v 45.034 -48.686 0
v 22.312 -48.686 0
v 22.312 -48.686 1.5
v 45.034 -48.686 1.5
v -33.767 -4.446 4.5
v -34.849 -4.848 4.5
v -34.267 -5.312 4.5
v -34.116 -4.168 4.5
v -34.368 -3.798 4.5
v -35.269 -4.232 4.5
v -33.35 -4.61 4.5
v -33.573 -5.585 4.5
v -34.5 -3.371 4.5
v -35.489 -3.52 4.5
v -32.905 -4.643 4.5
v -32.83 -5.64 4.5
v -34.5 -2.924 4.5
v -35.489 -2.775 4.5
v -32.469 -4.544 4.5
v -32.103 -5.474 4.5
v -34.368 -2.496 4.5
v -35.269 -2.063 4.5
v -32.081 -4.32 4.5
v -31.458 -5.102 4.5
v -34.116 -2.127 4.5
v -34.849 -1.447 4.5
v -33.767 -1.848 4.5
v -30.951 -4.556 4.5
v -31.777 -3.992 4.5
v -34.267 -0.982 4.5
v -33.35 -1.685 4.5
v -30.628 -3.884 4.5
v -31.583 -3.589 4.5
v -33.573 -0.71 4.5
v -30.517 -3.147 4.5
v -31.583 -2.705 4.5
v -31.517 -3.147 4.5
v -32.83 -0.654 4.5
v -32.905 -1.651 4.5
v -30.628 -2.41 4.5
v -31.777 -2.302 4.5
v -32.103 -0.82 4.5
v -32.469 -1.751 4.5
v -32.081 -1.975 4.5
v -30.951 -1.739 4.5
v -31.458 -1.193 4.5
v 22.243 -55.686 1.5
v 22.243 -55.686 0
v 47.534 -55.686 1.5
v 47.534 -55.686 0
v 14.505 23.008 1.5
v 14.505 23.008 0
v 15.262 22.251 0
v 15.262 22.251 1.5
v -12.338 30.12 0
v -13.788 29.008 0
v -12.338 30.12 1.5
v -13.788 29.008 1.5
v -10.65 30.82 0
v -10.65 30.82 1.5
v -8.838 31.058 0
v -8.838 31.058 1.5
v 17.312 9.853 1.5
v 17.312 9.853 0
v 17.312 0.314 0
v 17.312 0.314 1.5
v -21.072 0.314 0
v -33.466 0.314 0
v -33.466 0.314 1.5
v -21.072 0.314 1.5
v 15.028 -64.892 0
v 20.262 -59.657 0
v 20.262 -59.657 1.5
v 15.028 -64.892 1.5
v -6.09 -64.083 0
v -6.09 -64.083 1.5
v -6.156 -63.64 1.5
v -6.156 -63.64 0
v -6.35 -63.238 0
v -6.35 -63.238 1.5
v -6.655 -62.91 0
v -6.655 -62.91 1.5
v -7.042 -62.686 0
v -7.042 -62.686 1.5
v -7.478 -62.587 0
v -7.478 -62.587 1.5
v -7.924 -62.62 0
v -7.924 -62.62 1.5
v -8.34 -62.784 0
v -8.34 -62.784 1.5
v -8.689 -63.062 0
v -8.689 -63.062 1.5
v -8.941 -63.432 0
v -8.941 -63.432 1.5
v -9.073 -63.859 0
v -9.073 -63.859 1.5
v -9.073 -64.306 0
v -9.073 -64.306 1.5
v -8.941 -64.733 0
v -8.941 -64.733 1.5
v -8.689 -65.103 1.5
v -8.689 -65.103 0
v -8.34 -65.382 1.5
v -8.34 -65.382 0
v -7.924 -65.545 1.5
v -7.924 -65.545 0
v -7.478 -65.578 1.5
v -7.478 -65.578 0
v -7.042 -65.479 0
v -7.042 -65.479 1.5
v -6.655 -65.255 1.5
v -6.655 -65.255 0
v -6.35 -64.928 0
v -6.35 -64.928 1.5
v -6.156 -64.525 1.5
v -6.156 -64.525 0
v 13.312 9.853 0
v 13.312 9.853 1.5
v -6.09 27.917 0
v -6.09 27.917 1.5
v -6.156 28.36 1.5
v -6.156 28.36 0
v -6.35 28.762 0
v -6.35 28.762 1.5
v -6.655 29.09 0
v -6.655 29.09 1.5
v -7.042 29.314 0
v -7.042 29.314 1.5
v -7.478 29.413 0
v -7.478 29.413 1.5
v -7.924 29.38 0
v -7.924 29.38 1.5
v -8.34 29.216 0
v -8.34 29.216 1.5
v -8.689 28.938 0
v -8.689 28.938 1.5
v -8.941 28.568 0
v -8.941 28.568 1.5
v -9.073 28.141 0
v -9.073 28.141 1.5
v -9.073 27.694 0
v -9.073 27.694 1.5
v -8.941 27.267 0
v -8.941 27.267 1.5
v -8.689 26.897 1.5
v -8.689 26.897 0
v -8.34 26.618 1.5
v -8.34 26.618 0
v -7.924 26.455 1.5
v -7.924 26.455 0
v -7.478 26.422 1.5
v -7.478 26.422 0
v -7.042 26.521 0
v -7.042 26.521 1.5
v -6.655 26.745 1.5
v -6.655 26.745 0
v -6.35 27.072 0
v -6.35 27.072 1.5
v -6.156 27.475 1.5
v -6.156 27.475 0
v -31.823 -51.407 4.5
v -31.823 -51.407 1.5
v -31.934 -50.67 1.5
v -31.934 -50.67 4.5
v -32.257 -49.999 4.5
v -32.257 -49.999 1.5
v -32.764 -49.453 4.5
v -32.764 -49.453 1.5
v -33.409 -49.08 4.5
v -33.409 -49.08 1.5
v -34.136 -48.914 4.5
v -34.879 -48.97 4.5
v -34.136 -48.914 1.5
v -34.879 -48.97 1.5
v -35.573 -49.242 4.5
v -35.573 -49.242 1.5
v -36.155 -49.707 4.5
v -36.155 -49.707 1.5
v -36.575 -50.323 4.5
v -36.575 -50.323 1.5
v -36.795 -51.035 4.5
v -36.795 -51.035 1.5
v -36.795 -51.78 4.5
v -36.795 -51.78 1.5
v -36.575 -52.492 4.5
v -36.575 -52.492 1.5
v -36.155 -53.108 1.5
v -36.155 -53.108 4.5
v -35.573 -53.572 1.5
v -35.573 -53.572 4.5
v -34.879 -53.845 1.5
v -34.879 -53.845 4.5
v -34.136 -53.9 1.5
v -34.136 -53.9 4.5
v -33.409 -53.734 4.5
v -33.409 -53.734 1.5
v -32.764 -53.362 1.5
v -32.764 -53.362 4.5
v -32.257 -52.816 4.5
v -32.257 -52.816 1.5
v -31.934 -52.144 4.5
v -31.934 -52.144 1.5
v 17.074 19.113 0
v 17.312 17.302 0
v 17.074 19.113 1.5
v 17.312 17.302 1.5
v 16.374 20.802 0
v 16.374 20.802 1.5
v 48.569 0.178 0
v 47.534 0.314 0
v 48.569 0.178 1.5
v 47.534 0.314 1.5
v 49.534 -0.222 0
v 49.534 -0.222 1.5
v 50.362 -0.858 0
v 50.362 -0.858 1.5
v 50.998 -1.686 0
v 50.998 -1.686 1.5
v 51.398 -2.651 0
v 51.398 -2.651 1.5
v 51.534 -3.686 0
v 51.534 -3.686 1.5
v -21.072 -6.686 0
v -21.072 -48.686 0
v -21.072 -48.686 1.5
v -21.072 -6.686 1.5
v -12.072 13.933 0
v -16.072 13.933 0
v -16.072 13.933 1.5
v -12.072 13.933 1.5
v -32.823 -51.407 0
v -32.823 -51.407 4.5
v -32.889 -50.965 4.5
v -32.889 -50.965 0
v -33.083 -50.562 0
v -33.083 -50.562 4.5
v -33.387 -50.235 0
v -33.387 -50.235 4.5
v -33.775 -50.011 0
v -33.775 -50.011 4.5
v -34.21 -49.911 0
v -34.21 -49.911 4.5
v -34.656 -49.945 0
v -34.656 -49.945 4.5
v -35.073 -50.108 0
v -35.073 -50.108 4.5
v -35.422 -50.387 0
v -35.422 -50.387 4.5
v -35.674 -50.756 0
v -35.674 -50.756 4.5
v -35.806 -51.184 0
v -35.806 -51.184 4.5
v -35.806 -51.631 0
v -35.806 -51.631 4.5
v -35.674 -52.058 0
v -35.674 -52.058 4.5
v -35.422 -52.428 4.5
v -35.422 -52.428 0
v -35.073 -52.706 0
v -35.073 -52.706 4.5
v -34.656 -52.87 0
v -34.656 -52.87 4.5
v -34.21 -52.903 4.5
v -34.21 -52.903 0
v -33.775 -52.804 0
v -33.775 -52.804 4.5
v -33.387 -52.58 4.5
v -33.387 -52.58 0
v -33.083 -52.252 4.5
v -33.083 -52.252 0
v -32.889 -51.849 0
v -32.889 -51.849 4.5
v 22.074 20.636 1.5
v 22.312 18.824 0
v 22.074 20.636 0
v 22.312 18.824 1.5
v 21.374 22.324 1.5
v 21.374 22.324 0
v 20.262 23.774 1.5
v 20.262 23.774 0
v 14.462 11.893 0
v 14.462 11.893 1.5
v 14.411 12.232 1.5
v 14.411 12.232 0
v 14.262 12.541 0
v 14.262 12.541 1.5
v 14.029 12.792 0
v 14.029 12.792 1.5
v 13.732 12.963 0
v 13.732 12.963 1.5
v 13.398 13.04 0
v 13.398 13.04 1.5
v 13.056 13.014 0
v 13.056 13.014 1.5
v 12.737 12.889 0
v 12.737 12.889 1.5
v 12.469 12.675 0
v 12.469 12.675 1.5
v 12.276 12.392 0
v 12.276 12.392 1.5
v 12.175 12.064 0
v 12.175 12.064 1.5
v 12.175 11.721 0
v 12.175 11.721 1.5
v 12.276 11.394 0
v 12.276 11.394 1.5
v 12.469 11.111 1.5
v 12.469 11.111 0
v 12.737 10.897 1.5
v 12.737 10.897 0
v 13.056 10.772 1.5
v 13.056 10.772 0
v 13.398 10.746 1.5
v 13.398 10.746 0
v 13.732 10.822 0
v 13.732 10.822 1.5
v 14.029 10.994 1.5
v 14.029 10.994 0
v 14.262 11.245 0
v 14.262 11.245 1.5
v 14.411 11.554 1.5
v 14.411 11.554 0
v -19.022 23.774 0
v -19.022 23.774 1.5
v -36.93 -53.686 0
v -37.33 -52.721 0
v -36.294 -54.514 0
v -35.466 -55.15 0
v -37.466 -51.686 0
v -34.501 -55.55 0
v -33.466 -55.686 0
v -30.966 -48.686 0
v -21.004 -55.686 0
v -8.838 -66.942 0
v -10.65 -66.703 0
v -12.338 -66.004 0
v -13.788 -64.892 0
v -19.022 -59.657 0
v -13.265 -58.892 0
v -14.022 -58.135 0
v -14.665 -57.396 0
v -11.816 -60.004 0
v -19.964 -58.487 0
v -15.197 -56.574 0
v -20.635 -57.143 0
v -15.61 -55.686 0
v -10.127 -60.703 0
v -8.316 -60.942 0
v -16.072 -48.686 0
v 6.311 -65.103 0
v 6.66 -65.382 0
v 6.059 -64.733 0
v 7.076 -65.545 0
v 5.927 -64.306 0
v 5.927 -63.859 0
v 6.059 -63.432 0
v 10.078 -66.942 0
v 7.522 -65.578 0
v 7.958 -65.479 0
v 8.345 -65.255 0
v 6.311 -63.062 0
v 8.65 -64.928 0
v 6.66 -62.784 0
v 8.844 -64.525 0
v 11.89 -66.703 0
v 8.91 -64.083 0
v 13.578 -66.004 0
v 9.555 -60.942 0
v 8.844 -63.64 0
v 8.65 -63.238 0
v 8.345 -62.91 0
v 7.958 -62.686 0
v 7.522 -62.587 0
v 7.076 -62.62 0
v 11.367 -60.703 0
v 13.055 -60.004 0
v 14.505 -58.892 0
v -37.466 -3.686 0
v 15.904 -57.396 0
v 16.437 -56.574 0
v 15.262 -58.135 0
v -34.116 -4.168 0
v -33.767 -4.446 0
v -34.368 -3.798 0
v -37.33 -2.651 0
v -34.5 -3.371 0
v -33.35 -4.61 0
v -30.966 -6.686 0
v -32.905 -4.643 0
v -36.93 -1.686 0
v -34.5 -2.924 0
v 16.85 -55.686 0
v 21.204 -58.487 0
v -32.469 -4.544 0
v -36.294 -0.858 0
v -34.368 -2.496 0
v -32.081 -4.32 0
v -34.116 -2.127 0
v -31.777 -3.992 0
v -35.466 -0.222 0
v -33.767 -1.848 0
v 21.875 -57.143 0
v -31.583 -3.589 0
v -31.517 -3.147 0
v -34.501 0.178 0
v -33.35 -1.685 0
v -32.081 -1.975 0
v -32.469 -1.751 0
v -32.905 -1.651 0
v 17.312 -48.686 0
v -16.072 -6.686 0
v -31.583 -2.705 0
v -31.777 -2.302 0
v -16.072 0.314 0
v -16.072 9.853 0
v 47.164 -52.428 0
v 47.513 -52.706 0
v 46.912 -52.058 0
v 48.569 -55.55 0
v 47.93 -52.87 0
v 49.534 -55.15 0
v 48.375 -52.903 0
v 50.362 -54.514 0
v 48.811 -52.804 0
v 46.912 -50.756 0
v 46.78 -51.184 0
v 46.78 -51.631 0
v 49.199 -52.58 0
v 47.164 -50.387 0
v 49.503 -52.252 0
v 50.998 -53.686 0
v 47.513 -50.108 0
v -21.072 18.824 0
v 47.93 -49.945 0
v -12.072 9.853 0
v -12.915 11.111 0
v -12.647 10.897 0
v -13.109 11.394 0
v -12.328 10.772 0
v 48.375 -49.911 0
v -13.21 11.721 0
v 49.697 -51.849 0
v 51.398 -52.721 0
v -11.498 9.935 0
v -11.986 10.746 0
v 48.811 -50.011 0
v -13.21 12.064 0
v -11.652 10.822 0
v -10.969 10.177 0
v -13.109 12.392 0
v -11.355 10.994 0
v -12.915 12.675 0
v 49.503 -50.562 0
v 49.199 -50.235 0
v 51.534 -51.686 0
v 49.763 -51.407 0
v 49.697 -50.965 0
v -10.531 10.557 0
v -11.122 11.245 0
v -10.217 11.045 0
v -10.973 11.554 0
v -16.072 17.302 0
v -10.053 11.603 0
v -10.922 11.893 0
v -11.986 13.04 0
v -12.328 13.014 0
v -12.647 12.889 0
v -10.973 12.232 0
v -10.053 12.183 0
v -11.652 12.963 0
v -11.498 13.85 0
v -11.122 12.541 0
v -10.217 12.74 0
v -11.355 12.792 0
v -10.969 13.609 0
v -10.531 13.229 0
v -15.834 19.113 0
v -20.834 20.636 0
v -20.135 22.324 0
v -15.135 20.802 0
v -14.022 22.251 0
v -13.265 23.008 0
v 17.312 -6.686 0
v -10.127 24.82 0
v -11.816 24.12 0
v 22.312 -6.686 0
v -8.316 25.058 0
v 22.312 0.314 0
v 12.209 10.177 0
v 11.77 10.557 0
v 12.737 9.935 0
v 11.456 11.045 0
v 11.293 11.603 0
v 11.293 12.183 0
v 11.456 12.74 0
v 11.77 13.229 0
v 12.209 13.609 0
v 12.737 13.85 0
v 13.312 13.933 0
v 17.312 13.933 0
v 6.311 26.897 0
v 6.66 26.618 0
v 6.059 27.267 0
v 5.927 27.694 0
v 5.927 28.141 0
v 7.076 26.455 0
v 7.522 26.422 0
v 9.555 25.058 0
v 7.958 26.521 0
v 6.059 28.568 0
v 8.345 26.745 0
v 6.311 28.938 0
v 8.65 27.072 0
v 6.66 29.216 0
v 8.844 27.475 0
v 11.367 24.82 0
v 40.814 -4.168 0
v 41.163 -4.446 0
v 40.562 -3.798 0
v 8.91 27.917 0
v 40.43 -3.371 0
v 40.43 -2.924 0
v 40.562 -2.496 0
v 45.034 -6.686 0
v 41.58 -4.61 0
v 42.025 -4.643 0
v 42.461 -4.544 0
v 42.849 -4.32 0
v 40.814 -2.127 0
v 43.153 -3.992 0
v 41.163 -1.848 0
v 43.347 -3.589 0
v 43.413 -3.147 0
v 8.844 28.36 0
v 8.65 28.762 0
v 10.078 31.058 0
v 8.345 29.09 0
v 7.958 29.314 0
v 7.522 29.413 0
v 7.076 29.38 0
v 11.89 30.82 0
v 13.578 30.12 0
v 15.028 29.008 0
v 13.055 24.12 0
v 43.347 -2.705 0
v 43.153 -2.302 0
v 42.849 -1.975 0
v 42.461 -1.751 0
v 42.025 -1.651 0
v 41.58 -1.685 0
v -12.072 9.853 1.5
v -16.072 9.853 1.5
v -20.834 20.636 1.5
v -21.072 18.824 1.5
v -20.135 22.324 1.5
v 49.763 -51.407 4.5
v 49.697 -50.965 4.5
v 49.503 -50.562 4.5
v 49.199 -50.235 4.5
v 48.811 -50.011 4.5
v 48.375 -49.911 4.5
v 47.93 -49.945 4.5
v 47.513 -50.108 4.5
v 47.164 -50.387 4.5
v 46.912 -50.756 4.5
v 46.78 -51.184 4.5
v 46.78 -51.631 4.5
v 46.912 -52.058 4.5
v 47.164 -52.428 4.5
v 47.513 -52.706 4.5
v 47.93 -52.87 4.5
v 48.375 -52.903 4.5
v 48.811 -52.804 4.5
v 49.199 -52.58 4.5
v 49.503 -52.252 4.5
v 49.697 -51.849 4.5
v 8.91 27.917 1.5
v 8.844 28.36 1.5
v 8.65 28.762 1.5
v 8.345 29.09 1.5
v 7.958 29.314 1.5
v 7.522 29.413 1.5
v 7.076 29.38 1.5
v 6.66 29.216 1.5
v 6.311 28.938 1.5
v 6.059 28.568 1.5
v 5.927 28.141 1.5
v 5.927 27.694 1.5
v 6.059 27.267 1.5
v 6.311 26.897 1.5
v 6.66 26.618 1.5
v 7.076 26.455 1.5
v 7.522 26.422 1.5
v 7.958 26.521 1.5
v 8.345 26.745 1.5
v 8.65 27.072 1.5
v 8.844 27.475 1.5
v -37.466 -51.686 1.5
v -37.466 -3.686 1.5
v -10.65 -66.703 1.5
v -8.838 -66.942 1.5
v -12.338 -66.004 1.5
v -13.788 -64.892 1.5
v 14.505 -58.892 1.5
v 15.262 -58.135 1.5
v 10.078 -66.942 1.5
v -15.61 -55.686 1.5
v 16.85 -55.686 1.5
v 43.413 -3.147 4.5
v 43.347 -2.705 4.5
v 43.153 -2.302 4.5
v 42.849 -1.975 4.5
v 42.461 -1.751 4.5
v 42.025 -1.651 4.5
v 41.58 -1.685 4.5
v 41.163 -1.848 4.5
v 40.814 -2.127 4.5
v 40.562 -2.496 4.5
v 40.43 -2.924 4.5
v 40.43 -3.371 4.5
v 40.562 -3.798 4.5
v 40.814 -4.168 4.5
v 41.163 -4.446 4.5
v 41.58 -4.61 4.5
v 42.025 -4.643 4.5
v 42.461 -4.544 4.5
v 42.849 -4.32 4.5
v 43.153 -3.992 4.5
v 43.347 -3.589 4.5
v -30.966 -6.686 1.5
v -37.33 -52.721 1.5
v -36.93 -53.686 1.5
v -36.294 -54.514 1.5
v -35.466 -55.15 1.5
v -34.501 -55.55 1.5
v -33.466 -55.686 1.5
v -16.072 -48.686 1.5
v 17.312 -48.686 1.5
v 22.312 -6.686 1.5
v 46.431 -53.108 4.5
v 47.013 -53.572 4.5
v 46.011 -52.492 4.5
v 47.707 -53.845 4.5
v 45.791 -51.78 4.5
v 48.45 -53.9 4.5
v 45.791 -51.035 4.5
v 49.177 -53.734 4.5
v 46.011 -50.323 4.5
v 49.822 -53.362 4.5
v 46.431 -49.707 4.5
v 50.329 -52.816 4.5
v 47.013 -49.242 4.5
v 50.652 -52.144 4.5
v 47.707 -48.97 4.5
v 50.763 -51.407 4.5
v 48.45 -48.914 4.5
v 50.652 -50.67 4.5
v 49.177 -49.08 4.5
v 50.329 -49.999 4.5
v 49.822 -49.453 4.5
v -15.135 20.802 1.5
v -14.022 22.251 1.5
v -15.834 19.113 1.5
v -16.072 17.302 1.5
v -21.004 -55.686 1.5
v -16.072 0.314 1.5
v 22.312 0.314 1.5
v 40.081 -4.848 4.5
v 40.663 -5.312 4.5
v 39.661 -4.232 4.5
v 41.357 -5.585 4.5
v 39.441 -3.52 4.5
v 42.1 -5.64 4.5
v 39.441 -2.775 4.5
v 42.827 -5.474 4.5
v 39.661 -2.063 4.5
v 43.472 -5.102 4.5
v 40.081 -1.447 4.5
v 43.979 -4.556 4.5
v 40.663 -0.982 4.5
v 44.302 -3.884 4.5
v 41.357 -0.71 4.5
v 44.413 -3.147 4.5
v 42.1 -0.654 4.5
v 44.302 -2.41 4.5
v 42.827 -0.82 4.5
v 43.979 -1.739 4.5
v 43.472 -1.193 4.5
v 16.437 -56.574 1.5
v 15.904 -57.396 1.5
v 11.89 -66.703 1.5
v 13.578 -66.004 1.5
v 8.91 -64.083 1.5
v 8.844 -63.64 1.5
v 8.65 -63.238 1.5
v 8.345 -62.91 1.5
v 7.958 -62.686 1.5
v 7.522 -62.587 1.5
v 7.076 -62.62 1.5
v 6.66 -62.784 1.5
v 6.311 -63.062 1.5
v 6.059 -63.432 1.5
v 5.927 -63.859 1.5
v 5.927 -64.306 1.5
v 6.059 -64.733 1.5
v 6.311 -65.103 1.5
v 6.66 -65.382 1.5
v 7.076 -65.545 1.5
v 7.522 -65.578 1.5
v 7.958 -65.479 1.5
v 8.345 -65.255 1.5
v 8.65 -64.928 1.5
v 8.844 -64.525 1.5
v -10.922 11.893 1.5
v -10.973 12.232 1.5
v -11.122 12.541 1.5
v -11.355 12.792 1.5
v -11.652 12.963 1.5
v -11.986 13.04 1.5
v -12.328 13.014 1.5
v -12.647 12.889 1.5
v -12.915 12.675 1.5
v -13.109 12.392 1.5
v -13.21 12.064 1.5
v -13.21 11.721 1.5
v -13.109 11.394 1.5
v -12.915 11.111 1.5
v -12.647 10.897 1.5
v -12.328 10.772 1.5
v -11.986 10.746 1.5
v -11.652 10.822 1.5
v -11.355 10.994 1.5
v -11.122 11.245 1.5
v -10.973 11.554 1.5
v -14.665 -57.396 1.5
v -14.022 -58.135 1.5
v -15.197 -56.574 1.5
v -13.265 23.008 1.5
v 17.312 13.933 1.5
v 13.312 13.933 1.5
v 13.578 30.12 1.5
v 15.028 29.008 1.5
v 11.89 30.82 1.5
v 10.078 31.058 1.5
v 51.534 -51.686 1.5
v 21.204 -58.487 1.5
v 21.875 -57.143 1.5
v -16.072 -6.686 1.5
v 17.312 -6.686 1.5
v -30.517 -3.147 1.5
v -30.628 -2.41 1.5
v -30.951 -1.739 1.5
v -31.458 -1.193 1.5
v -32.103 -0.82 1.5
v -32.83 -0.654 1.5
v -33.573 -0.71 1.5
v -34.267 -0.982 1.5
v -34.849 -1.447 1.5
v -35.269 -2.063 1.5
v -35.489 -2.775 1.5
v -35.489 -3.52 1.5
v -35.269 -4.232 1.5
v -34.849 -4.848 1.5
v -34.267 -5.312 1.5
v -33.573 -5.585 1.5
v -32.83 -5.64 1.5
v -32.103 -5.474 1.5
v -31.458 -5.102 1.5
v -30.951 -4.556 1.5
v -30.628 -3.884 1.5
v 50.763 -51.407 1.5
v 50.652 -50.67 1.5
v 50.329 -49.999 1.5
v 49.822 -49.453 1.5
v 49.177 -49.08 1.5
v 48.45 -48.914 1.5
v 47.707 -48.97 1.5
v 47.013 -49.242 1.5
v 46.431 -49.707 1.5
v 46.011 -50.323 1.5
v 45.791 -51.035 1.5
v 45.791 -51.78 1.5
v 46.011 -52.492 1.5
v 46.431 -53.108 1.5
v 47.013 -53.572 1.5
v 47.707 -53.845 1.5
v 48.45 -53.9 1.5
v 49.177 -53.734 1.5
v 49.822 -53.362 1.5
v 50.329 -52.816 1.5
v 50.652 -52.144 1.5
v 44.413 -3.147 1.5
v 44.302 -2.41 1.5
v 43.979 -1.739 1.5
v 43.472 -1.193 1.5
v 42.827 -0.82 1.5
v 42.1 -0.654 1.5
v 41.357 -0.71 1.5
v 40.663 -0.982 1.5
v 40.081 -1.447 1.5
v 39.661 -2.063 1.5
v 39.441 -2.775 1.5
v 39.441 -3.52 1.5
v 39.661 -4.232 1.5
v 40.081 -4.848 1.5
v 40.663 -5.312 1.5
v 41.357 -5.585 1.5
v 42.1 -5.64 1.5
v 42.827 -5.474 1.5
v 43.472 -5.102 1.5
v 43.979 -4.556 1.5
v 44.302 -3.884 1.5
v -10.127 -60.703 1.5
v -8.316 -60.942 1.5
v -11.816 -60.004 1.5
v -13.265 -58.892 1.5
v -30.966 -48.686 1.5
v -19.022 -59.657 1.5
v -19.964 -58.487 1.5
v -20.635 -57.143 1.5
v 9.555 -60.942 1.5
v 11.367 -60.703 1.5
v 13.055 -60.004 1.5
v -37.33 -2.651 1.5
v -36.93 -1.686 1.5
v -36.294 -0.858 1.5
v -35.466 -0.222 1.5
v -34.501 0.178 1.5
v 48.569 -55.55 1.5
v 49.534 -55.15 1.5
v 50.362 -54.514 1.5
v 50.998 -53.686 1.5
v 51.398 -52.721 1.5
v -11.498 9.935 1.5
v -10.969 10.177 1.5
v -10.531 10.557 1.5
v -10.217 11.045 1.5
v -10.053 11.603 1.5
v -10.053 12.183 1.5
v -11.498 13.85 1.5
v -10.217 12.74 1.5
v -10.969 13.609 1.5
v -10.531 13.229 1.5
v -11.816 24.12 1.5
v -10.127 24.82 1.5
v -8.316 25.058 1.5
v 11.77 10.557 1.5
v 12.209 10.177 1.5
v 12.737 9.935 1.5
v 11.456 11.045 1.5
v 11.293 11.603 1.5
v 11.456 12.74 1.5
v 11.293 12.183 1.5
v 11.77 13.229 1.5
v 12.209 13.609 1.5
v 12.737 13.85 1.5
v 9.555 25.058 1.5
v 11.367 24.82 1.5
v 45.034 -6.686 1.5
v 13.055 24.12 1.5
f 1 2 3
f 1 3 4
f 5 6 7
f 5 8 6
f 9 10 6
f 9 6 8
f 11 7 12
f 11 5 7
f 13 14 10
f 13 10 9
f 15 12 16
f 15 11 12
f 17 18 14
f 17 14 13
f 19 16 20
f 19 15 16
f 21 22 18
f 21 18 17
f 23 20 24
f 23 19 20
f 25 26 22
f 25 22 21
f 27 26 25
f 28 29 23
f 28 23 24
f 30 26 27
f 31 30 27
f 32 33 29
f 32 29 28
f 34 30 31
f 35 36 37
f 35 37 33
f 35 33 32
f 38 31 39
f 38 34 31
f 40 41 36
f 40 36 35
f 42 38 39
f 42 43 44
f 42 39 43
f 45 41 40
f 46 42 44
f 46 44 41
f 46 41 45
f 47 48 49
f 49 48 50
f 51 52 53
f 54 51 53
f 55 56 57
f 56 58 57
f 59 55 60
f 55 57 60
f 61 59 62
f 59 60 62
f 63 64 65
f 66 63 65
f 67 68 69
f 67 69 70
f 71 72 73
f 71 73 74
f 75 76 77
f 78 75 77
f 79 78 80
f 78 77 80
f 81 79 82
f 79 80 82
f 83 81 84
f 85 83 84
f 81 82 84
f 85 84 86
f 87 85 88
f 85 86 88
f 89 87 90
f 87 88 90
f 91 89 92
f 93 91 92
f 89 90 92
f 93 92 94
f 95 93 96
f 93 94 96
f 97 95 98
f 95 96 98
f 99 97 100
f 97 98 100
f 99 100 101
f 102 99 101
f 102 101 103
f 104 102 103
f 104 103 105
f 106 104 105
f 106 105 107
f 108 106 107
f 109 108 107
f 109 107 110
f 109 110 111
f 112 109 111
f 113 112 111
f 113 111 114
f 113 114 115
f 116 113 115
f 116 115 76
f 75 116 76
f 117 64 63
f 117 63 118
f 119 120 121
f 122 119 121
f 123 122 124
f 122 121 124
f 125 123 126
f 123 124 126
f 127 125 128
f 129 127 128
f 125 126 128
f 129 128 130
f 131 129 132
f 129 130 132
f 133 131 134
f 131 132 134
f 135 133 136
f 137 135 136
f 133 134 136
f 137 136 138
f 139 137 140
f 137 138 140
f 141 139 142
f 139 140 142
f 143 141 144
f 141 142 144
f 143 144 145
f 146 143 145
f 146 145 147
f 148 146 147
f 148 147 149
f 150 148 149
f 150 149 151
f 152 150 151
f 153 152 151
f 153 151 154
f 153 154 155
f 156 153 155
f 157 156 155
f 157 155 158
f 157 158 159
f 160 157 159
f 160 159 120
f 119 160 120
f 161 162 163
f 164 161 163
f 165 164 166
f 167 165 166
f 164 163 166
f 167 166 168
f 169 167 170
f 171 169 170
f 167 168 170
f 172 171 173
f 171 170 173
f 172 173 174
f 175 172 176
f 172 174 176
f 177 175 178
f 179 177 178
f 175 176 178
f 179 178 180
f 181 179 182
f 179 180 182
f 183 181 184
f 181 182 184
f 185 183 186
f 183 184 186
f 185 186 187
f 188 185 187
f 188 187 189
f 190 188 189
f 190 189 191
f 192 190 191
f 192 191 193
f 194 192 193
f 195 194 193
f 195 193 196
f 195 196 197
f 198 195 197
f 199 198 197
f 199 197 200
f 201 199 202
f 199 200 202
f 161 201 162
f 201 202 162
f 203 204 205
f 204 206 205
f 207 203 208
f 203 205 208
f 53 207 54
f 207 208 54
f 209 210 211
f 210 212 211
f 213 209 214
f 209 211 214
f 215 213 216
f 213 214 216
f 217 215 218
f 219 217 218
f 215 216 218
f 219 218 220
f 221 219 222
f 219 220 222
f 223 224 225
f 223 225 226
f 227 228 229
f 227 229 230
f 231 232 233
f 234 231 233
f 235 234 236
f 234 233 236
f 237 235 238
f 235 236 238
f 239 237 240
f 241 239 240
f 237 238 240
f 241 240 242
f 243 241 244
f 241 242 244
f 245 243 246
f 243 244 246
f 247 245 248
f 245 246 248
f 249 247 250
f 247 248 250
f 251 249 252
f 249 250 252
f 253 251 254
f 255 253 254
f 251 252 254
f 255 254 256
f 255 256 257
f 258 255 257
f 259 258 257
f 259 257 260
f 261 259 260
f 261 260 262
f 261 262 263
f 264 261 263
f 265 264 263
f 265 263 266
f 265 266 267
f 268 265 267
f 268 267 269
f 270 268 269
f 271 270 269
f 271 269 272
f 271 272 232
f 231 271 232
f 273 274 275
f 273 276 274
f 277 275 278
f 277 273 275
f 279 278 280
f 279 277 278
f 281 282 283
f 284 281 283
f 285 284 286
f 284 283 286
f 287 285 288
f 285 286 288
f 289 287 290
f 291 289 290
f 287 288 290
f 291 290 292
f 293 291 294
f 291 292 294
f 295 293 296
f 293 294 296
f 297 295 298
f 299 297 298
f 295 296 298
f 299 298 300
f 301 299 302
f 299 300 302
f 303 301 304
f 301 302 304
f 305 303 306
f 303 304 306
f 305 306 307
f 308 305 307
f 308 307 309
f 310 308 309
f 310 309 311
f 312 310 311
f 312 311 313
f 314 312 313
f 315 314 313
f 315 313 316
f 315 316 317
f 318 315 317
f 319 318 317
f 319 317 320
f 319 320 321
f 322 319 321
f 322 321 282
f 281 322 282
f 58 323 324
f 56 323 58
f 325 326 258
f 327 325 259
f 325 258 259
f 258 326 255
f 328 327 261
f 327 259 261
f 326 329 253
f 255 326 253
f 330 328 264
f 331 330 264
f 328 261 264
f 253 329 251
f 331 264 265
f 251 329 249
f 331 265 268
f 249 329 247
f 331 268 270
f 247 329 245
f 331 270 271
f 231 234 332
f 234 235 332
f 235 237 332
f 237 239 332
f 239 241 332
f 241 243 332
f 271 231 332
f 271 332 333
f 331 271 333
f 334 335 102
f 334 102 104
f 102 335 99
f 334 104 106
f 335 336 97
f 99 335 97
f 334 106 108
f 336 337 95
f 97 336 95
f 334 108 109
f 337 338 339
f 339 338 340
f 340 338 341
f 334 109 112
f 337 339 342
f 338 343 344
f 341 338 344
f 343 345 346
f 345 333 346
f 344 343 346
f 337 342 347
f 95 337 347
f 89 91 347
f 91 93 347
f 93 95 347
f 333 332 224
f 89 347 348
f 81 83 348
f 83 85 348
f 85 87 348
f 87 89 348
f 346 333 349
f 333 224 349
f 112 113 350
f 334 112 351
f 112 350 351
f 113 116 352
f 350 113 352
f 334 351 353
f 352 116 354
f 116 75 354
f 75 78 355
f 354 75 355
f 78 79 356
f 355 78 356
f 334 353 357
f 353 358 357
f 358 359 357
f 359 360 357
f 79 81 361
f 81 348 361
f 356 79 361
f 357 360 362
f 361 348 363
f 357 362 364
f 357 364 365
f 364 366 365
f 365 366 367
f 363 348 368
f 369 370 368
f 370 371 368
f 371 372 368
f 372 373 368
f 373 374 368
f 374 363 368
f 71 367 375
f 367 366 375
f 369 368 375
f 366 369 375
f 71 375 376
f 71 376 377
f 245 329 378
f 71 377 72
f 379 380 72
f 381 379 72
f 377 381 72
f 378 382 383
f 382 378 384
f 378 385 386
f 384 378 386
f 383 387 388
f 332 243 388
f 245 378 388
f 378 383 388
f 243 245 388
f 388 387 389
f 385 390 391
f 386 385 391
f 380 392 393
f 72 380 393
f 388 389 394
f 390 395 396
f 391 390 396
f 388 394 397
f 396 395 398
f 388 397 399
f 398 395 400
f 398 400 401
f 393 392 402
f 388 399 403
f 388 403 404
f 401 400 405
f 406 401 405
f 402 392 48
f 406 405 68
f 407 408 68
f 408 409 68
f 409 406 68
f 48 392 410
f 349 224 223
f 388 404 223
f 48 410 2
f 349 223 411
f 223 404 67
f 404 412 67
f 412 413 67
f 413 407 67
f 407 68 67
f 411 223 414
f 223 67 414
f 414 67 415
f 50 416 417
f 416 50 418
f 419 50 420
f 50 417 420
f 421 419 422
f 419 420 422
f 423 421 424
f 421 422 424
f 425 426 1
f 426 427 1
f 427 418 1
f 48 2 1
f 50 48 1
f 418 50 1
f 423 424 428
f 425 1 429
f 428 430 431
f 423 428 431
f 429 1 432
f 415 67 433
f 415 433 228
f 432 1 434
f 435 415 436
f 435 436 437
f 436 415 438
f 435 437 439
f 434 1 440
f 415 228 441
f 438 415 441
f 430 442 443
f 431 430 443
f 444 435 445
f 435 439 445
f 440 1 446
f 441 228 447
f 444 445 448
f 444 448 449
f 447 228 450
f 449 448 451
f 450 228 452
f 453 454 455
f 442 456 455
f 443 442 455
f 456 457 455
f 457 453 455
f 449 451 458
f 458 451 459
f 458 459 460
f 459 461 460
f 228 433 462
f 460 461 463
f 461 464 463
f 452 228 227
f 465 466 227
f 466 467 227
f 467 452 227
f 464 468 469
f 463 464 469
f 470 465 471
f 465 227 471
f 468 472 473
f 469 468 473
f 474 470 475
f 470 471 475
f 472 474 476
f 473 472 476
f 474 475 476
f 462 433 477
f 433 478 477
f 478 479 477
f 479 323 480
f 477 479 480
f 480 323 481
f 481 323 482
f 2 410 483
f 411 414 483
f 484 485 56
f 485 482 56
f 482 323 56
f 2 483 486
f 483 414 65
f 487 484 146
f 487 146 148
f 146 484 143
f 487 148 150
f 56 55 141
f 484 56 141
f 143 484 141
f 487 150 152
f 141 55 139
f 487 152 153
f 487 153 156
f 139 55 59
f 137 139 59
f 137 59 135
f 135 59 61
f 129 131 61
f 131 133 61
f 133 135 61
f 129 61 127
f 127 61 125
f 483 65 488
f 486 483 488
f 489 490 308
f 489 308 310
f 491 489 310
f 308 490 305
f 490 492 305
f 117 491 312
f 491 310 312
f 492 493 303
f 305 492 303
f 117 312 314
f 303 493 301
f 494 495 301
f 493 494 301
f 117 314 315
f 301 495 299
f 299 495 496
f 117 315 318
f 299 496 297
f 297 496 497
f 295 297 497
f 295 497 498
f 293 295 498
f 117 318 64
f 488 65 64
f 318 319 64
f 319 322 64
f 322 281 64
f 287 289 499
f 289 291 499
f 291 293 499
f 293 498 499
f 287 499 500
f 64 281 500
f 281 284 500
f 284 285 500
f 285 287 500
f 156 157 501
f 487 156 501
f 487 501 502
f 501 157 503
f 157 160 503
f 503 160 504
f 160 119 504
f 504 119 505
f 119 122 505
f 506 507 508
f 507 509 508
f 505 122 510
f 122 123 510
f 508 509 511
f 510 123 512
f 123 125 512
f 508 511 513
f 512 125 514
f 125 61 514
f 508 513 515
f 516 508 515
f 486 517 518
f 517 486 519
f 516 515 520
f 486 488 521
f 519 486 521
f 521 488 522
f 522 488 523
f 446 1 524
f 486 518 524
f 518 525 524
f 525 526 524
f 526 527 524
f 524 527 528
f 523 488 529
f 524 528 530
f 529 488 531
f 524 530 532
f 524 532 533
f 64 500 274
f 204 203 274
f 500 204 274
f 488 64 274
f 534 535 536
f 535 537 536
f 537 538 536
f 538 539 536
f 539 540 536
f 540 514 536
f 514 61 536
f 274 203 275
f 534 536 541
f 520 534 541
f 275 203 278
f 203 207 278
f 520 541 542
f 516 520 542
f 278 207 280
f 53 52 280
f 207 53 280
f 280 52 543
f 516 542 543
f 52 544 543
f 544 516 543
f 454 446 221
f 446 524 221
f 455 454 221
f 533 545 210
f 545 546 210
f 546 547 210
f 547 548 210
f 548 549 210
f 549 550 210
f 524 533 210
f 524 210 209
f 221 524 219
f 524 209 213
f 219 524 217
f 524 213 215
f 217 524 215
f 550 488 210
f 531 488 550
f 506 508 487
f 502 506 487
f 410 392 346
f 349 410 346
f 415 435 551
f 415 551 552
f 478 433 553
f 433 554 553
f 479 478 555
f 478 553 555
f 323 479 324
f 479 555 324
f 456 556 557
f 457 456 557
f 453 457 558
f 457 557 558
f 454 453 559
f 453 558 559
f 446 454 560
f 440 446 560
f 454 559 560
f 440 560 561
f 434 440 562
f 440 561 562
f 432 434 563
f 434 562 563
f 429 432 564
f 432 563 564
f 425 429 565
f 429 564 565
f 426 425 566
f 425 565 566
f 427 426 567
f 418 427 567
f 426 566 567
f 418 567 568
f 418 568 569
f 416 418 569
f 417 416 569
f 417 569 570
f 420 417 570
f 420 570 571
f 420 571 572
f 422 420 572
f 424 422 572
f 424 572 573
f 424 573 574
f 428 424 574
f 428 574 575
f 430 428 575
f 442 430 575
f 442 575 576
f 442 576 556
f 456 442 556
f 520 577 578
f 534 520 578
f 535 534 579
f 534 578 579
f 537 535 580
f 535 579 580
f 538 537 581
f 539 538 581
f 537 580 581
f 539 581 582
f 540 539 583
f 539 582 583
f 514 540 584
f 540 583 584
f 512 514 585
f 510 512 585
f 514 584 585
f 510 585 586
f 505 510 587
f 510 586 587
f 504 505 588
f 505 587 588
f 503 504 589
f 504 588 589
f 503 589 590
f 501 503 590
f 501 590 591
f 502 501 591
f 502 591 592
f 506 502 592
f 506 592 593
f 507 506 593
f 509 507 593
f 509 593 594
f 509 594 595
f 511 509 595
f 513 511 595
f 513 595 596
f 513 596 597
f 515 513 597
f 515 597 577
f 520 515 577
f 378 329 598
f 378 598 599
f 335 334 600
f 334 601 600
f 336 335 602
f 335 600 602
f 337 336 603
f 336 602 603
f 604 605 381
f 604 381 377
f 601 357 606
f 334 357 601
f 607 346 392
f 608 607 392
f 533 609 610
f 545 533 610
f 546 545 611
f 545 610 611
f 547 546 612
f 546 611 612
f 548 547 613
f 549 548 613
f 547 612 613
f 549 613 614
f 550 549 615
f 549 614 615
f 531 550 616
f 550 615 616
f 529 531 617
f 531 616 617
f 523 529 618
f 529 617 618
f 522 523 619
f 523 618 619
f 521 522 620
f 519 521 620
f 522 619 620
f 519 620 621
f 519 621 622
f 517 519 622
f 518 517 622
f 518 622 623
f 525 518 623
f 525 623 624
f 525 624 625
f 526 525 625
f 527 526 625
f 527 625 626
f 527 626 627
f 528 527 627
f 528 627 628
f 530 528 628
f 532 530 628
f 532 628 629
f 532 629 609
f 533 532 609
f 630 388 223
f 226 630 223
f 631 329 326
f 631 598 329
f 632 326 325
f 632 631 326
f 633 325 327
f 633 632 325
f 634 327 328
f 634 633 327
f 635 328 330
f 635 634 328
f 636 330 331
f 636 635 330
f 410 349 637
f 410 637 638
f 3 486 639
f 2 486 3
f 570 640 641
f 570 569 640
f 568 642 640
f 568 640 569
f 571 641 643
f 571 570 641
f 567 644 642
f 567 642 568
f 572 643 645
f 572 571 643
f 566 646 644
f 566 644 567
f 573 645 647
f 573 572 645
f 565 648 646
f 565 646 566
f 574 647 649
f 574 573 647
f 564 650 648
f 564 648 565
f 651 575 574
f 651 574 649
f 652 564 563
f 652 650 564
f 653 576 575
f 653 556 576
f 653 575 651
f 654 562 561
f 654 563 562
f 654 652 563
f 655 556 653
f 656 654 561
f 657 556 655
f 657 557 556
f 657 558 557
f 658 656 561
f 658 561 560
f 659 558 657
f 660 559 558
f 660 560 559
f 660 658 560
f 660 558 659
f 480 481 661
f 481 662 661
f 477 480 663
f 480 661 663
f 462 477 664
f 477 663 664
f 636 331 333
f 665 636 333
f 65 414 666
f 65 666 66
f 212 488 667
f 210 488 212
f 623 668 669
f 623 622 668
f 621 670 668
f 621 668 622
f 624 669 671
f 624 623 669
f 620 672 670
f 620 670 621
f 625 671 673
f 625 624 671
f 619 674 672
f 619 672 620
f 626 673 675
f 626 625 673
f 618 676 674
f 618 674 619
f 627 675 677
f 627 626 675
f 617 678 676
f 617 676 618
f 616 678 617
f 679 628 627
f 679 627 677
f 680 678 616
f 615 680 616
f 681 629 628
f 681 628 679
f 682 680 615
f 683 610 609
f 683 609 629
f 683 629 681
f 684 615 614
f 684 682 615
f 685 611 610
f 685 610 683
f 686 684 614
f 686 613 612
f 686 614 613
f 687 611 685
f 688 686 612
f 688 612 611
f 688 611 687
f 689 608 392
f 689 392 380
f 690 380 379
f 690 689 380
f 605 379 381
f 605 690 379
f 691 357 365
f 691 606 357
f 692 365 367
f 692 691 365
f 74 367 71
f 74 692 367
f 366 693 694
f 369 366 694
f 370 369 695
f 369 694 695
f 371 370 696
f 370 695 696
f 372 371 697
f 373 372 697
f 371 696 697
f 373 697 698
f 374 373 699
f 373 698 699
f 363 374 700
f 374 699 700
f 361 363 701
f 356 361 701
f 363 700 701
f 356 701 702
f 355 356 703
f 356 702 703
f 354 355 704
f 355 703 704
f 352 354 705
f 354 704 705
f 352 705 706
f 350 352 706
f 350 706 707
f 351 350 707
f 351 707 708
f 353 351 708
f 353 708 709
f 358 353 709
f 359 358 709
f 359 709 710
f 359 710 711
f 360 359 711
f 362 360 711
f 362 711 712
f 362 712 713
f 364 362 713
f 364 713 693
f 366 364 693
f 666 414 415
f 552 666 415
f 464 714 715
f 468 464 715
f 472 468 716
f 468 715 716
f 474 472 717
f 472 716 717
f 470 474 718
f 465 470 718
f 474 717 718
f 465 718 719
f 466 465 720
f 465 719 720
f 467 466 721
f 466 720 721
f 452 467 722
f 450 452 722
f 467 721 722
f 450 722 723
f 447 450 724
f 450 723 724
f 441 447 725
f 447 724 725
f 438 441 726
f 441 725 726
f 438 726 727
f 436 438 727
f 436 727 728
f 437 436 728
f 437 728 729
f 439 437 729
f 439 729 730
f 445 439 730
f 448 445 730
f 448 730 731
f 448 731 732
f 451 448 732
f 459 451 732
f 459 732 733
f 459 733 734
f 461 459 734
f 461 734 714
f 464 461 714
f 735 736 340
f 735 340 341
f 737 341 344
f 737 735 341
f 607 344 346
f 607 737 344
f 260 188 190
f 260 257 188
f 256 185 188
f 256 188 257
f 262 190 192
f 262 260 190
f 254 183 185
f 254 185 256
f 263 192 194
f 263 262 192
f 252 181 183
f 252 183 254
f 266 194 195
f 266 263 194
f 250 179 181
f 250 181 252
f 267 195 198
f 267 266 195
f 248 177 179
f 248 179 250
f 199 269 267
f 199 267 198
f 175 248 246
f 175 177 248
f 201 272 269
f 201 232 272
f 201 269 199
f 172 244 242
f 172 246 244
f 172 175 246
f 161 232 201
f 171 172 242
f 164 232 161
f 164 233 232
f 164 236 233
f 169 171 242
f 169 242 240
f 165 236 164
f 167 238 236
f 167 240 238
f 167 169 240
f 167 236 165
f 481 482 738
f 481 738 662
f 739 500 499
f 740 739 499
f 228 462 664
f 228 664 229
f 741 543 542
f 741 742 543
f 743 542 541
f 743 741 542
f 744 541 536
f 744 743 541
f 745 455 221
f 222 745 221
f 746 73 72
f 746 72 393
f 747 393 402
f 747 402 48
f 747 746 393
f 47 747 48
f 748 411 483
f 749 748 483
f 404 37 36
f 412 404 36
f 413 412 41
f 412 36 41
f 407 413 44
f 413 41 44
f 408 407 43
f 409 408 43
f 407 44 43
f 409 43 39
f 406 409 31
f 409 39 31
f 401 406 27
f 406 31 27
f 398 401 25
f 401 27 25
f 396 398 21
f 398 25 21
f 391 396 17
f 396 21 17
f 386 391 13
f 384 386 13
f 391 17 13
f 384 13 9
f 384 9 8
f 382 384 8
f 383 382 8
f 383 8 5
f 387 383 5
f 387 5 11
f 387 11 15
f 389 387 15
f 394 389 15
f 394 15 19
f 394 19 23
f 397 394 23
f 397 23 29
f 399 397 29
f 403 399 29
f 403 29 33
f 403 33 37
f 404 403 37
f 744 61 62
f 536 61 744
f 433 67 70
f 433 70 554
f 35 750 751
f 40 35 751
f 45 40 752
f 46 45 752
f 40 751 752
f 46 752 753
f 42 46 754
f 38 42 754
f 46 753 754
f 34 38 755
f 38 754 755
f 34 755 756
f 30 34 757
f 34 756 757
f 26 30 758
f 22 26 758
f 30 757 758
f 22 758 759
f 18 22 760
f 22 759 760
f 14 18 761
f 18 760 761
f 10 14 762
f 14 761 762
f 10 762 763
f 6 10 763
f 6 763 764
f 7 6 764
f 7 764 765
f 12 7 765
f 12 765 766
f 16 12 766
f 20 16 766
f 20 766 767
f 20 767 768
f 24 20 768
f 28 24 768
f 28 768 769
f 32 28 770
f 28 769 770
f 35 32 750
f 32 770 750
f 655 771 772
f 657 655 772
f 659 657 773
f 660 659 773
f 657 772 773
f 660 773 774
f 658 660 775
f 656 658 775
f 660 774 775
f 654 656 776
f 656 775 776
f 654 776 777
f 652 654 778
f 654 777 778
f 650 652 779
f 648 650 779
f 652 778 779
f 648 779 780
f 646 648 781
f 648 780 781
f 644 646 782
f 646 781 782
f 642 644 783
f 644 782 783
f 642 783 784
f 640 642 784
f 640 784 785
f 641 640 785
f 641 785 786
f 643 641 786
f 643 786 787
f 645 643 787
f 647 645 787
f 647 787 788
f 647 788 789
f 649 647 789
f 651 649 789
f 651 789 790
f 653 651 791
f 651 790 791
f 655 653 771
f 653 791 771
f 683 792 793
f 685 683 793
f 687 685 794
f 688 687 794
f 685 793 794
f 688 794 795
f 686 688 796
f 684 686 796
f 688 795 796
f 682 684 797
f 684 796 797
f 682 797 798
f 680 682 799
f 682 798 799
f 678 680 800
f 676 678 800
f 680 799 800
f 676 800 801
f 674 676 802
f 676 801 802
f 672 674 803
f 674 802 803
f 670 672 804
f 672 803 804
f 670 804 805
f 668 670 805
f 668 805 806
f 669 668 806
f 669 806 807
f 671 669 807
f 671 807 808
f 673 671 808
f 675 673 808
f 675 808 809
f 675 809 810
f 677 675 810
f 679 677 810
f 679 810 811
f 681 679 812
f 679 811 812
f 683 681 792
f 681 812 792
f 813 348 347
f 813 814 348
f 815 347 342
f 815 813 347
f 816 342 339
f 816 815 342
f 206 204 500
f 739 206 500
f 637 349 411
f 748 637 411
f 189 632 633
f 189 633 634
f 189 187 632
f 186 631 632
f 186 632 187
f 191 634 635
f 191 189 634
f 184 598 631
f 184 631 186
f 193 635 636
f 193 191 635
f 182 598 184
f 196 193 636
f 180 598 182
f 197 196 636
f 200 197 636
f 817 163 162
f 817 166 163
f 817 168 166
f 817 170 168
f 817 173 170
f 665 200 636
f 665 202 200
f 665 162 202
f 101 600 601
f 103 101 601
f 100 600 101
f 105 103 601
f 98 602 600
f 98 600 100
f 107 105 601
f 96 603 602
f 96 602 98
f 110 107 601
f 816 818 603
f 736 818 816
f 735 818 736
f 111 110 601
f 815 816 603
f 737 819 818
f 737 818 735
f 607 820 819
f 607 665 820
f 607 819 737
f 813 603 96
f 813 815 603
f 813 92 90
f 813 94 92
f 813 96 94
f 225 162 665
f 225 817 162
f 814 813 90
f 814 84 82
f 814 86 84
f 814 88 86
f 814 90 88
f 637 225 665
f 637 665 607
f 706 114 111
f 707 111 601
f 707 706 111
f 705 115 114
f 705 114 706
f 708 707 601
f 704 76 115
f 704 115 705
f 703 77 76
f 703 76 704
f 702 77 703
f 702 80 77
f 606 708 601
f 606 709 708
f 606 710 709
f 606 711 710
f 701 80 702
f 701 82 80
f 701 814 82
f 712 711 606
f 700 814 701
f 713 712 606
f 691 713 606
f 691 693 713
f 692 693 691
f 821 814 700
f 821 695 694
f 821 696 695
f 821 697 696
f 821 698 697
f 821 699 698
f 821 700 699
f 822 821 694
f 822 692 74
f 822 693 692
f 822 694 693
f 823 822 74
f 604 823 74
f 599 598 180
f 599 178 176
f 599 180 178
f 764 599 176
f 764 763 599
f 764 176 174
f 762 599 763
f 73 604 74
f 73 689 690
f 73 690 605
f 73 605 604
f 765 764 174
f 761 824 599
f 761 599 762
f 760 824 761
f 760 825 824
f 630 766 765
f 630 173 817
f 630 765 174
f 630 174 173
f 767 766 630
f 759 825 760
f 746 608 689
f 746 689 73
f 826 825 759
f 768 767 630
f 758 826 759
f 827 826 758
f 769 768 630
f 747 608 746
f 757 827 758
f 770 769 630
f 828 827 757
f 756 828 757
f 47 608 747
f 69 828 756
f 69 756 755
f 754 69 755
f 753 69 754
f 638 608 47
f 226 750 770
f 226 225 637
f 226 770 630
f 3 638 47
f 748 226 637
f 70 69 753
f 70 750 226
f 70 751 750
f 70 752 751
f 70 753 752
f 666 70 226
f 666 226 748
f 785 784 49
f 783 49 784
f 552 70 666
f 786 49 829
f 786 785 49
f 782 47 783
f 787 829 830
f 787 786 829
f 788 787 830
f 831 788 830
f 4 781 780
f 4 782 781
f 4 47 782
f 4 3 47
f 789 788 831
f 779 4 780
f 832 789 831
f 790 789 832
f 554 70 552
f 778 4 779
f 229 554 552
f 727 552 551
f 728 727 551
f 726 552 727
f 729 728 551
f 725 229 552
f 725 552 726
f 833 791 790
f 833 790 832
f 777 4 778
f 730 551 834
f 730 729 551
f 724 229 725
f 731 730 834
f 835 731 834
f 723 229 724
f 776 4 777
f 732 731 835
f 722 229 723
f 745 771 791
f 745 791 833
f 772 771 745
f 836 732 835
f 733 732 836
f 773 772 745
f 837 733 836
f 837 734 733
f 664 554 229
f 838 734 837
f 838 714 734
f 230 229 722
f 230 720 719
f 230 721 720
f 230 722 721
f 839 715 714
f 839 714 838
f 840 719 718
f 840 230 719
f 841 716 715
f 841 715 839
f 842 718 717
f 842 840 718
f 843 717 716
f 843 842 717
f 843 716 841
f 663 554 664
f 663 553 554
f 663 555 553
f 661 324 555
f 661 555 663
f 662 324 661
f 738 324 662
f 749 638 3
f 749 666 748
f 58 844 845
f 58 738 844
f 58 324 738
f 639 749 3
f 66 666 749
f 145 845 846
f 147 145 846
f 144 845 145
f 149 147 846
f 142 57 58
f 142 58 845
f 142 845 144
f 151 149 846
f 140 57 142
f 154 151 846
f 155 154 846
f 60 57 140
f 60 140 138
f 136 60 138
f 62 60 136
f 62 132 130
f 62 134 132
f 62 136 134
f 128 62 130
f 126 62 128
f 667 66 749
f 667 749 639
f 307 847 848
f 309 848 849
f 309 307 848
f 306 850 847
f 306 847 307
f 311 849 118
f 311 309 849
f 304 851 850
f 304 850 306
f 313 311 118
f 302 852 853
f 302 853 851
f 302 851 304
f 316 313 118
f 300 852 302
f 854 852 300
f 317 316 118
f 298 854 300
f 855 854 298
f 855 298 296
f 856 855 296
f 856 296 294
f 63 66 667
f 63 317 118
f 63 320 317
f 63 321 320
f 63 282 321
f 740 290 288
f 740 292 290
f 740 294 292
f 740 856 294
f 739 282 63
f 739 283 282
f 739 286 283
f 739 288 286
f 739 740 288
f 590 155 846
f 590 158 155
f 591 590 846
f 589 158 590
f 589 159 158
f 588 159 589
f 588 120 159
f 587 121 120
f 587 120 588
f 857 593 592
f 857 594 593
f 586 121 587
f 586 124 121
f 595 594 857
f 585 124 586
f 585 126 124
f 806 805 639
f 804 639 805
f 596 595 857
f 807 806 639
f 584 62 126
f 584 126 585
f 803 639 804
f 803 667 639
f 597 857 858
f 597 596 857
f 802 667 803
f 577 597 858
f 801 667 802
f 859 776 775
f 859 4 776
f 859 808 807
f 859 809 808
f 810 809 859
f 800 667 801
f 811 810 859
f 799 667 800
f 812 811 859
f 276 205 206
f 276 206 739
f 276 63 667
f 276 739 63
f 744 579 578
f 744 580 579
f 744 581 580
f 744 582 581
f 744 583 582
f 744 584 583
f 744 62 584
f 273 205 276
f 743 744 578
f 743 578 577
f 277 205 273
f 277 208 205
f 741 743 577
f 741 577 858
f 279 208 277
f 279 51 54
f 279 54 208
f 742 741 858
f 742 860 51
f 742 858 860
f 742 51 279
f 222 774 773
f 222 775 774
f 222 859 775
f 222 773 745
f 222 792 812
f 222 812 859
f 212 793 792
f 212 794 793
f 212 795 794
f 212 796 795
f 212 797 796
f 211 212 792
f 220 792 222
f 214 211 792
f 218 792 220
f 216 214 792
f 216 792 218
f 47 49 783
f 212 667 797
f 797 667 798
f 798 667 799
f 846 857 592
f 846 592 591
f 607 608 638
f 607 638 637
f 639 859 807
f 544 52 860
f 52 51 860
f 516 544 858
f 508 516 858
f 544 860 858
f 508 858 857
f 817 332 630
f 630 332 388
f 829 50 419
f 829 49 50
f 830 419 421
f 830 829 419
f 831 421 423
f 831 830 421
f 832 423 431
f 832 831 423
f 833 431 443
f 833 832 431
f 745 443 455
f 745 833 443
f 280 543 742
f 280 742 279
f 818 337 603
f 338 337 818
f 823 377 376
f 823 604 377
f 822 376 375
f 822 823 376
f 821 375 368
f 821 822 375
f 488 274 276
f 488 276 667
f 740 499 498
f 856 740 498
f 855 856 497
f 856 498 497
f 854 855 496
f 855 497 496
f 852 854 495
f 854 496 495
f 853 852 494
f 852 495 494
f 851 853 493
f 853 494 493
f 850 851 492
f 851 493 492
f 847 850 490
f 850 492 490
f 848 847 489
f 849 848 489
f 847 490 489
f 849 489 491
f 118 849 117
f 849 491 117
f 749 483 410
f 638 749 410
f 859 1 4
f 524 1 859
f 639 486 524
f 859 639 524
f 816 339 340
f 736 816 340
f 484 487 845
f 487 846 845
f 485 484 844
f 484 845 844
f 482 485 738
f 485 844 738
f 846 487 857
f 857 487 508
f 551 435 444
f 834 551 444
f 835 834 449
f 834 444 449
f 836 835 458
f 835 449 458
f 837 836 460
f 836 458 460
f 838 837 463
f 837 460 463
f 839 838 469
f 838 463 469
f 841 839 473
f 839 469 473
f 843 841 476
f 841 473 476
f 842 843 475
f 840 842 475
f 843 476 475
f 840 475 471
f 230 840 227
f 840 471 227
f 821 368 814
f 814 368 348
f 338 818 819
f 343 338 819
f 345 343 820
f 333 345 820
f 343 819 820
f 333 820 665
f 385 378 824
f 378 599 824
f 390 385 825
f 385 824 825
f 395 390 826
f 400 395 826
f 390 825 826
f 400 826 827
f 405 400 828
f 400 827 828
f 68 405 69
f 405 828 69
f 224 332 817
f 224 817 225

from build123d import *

# Parameters (mm, degrees)
SKETCH_W        = 89
SKETCH_H        = 56
SKETCH_W_2      = 76
SKETCH_H_2      = 42
PAD_DEPTH       = 1.5
SKETCH001_R     = 2.5
PAD001_DEPTH    = 3
SKETCH002_R     = 1.5
POCKET_DEPTH    = 4.501
FILLET_R        = 4
PAD002_DEPTH    = 1.5
SKETCH004_R     = 1.5
SKETCH004_R_2   = 1.15
POCKET001_DEPTH = 1.501
FILLET001_R     = 7


with BuildPart() as arduinosupport:
    # Sketch → Pad (new body)
    with BuildSketch(Plane.XY):
        with Locations((7.033953, -27.68594)):
            Rectangle(SKETCH_W, SKETCH_H)
        with Locations((7.033953, -27.68594)):
            Rectangle(SKETCH_W_2, SKETCH_H_2, mode=Mode.SUBTRACT)
    extrude(amount=PAD_DEPTH)

    # Sketch001 (on Face10 of Pad) → Pad001 (join)
    with BuildSketch(Plane.XY.offset(1.5)):
        with Locations((-33.016678, -3.147287)):
            Circle(SKETCH001_R)
        with Locations((-34.322529, -51.407287)):
            Circle(SKETCH001_R)
        with Locations((41.913322, -3.147287)):
            Circle(SKETCH001_R)
        with Locations((48.263322, -51.407287)):
            Circle(SKETCH001_R)
    extrude(amount=PAD001_DEPTH)

    # Sketch002 (on Face15 of Pad001) → Pocket (cut, through all)
    with BuildSketch(Plane.XY.offset(4.5)):
        with Locations((-33.016678, -3.147287)):
            Circle(SKETCH002_R)
        with Locations((-34.322529, -51.407287)):
            Circle(SKETCH002_R)
        with Locations((48.263322, -51.407287)):
            Circle(SKETCH002_R)
        with Locations((41.913322, -3.147287)):
            Circle(SKETCH002_R)
    extrude(amount=-POCKET_DEPTH, mode=Mode.SUBTRACT)

    # Fillet
    fillet_edges = [arduinosupport.edges().sort_by_distance(p)[0] for p in [
        (51.533953, 0.31406, 0.75),
        (51.533953, -55.68594, 0.75),
        (-37.466047, -55.68594, 0.75),
        (-37.466047, 0.31406, 0.75),
    ]]
    fillet(fillet_edges, radius=FILLET_R)


with BuildPart() as muxsupport:
    # Sketch003 → Pad002 (new body)
    with BuildSketch(Plane.XY):
        Polygon((12.977516, -66.941809), (-11.737781, -66.941809), (-21.072386, -57.607204), (-21.072386, 21.723586), (-11.737781, 31.058191), (12.977516, 31.058191), (22.312121, 21.723586), (22.312121, -57.607204), align=None)
        with BuildLine():
            Line((17.312121, 20.201021), (17.312121, 13.932858))
            Line((17.312121, 13.932858), (13.312121, 13.932858))
            ThreePointArc((13.312121, 13.932858), (11.272121, 11.892858), (13.312121, 9.852858))
            Line((17.312121, 9.852858), (13.312121, 9.852858))
            Line((17.312121, 9.852858), (17.312121, -56.084639))
            Line((17.312121, -56.084639), (12.454951, -60.941809))
            Line((12.454951, -60.941809), (-11.215216, -60.941809))
            Line((-11.215216, -60.941809), (-16.072386, -56.084639))
            Line((-16.072386, -56.084639), (-16.072386, 9.852858))
            Line((-12.072386, 9.852858), (-16.072386, 9.852858))
            ThreePointArc((-12.072386, 9.852858), (-10.032386, 11.892858), (-12.072386, 13.932858))
            Line((-16.072386, 13.932858), (-12.072386, 13.932858))
            Line((-16.072386, 20.201021), (-16.072386, 13.932858))
            Line((-11.215216, 25.058191), (-16.072386, 20.201021))
            Line((-11.215216, 25.058191), (12.454951, 25.058191))
            Line((12.454951, 25.058191), (17.312121, 20.201021))
        make_face(mode=Mode.SUBTRACT)
    extrude(amount=PAD002_DEPTH)

    # Sketch004 (on Face26 of Pad002) → Pocket001 (cut, through all)
    with BuildSketch(Plane.XY.offset(1.5)):
        with Locations((-7.589837, 27.917404)):
            Circle(SKETCH004_R)
        with Locations((7.410163, 27.917404)):
            Circle(SKETCH004_R)
        with Locations((-7.589837, -64.082596)):
            Circle(SKETCH004_R)
        with Locations((7.410163, -64.082596)):
            Circle(SKETCH004_R)
        with Locations((13.312121, 11.892858)):
            Circle(SKETCH004_R_2)
        with Locations((-12.072386, 11.892858)):
            Circle(SKETCH004_R_2)
    extrude(amount=-POCKET001_DEPTH, mode=Mode.SUBTRACT)

    # Fillet001
    fillet001_edges = [muxsupport.edges().sort_by_distance(p)[0] for p in [
        (12.977516, -66.941809, 0.75),
        (22.312121, -57.607204, 0.75),
        (-11.737781, -66.941809, 0.75),
        (-21.072386, -57.607204, 0.75),
        (-16.072386, -56.084639, 0.75),
        (17.312121, -56.084639, 0.75),
        (12.454951, -60.941809, 0.75),
        (-11.215216, -60.941809, 0.75),
        (-21.072386, 21.723586, 0.75),
        (-11.737781, 31.058191, 0.75),
        (22.312121, 21.723586, 0.75),
        (12.977516, 31.058191, 0.75),
        (-16.072386, 20.201021, 0.75),
        (-11.215216, 25.058191, 0.75),
        (12.454951, 25.058191, 0.75),
        (17.312121, 20.201021, 0.75),
    ]]
    fillet(fillet001_edges, radius=FILLET001_R)

    # Boolean: union ArduinoSupport
    add(arduinosupport.part)


solid = muxsupport.part
